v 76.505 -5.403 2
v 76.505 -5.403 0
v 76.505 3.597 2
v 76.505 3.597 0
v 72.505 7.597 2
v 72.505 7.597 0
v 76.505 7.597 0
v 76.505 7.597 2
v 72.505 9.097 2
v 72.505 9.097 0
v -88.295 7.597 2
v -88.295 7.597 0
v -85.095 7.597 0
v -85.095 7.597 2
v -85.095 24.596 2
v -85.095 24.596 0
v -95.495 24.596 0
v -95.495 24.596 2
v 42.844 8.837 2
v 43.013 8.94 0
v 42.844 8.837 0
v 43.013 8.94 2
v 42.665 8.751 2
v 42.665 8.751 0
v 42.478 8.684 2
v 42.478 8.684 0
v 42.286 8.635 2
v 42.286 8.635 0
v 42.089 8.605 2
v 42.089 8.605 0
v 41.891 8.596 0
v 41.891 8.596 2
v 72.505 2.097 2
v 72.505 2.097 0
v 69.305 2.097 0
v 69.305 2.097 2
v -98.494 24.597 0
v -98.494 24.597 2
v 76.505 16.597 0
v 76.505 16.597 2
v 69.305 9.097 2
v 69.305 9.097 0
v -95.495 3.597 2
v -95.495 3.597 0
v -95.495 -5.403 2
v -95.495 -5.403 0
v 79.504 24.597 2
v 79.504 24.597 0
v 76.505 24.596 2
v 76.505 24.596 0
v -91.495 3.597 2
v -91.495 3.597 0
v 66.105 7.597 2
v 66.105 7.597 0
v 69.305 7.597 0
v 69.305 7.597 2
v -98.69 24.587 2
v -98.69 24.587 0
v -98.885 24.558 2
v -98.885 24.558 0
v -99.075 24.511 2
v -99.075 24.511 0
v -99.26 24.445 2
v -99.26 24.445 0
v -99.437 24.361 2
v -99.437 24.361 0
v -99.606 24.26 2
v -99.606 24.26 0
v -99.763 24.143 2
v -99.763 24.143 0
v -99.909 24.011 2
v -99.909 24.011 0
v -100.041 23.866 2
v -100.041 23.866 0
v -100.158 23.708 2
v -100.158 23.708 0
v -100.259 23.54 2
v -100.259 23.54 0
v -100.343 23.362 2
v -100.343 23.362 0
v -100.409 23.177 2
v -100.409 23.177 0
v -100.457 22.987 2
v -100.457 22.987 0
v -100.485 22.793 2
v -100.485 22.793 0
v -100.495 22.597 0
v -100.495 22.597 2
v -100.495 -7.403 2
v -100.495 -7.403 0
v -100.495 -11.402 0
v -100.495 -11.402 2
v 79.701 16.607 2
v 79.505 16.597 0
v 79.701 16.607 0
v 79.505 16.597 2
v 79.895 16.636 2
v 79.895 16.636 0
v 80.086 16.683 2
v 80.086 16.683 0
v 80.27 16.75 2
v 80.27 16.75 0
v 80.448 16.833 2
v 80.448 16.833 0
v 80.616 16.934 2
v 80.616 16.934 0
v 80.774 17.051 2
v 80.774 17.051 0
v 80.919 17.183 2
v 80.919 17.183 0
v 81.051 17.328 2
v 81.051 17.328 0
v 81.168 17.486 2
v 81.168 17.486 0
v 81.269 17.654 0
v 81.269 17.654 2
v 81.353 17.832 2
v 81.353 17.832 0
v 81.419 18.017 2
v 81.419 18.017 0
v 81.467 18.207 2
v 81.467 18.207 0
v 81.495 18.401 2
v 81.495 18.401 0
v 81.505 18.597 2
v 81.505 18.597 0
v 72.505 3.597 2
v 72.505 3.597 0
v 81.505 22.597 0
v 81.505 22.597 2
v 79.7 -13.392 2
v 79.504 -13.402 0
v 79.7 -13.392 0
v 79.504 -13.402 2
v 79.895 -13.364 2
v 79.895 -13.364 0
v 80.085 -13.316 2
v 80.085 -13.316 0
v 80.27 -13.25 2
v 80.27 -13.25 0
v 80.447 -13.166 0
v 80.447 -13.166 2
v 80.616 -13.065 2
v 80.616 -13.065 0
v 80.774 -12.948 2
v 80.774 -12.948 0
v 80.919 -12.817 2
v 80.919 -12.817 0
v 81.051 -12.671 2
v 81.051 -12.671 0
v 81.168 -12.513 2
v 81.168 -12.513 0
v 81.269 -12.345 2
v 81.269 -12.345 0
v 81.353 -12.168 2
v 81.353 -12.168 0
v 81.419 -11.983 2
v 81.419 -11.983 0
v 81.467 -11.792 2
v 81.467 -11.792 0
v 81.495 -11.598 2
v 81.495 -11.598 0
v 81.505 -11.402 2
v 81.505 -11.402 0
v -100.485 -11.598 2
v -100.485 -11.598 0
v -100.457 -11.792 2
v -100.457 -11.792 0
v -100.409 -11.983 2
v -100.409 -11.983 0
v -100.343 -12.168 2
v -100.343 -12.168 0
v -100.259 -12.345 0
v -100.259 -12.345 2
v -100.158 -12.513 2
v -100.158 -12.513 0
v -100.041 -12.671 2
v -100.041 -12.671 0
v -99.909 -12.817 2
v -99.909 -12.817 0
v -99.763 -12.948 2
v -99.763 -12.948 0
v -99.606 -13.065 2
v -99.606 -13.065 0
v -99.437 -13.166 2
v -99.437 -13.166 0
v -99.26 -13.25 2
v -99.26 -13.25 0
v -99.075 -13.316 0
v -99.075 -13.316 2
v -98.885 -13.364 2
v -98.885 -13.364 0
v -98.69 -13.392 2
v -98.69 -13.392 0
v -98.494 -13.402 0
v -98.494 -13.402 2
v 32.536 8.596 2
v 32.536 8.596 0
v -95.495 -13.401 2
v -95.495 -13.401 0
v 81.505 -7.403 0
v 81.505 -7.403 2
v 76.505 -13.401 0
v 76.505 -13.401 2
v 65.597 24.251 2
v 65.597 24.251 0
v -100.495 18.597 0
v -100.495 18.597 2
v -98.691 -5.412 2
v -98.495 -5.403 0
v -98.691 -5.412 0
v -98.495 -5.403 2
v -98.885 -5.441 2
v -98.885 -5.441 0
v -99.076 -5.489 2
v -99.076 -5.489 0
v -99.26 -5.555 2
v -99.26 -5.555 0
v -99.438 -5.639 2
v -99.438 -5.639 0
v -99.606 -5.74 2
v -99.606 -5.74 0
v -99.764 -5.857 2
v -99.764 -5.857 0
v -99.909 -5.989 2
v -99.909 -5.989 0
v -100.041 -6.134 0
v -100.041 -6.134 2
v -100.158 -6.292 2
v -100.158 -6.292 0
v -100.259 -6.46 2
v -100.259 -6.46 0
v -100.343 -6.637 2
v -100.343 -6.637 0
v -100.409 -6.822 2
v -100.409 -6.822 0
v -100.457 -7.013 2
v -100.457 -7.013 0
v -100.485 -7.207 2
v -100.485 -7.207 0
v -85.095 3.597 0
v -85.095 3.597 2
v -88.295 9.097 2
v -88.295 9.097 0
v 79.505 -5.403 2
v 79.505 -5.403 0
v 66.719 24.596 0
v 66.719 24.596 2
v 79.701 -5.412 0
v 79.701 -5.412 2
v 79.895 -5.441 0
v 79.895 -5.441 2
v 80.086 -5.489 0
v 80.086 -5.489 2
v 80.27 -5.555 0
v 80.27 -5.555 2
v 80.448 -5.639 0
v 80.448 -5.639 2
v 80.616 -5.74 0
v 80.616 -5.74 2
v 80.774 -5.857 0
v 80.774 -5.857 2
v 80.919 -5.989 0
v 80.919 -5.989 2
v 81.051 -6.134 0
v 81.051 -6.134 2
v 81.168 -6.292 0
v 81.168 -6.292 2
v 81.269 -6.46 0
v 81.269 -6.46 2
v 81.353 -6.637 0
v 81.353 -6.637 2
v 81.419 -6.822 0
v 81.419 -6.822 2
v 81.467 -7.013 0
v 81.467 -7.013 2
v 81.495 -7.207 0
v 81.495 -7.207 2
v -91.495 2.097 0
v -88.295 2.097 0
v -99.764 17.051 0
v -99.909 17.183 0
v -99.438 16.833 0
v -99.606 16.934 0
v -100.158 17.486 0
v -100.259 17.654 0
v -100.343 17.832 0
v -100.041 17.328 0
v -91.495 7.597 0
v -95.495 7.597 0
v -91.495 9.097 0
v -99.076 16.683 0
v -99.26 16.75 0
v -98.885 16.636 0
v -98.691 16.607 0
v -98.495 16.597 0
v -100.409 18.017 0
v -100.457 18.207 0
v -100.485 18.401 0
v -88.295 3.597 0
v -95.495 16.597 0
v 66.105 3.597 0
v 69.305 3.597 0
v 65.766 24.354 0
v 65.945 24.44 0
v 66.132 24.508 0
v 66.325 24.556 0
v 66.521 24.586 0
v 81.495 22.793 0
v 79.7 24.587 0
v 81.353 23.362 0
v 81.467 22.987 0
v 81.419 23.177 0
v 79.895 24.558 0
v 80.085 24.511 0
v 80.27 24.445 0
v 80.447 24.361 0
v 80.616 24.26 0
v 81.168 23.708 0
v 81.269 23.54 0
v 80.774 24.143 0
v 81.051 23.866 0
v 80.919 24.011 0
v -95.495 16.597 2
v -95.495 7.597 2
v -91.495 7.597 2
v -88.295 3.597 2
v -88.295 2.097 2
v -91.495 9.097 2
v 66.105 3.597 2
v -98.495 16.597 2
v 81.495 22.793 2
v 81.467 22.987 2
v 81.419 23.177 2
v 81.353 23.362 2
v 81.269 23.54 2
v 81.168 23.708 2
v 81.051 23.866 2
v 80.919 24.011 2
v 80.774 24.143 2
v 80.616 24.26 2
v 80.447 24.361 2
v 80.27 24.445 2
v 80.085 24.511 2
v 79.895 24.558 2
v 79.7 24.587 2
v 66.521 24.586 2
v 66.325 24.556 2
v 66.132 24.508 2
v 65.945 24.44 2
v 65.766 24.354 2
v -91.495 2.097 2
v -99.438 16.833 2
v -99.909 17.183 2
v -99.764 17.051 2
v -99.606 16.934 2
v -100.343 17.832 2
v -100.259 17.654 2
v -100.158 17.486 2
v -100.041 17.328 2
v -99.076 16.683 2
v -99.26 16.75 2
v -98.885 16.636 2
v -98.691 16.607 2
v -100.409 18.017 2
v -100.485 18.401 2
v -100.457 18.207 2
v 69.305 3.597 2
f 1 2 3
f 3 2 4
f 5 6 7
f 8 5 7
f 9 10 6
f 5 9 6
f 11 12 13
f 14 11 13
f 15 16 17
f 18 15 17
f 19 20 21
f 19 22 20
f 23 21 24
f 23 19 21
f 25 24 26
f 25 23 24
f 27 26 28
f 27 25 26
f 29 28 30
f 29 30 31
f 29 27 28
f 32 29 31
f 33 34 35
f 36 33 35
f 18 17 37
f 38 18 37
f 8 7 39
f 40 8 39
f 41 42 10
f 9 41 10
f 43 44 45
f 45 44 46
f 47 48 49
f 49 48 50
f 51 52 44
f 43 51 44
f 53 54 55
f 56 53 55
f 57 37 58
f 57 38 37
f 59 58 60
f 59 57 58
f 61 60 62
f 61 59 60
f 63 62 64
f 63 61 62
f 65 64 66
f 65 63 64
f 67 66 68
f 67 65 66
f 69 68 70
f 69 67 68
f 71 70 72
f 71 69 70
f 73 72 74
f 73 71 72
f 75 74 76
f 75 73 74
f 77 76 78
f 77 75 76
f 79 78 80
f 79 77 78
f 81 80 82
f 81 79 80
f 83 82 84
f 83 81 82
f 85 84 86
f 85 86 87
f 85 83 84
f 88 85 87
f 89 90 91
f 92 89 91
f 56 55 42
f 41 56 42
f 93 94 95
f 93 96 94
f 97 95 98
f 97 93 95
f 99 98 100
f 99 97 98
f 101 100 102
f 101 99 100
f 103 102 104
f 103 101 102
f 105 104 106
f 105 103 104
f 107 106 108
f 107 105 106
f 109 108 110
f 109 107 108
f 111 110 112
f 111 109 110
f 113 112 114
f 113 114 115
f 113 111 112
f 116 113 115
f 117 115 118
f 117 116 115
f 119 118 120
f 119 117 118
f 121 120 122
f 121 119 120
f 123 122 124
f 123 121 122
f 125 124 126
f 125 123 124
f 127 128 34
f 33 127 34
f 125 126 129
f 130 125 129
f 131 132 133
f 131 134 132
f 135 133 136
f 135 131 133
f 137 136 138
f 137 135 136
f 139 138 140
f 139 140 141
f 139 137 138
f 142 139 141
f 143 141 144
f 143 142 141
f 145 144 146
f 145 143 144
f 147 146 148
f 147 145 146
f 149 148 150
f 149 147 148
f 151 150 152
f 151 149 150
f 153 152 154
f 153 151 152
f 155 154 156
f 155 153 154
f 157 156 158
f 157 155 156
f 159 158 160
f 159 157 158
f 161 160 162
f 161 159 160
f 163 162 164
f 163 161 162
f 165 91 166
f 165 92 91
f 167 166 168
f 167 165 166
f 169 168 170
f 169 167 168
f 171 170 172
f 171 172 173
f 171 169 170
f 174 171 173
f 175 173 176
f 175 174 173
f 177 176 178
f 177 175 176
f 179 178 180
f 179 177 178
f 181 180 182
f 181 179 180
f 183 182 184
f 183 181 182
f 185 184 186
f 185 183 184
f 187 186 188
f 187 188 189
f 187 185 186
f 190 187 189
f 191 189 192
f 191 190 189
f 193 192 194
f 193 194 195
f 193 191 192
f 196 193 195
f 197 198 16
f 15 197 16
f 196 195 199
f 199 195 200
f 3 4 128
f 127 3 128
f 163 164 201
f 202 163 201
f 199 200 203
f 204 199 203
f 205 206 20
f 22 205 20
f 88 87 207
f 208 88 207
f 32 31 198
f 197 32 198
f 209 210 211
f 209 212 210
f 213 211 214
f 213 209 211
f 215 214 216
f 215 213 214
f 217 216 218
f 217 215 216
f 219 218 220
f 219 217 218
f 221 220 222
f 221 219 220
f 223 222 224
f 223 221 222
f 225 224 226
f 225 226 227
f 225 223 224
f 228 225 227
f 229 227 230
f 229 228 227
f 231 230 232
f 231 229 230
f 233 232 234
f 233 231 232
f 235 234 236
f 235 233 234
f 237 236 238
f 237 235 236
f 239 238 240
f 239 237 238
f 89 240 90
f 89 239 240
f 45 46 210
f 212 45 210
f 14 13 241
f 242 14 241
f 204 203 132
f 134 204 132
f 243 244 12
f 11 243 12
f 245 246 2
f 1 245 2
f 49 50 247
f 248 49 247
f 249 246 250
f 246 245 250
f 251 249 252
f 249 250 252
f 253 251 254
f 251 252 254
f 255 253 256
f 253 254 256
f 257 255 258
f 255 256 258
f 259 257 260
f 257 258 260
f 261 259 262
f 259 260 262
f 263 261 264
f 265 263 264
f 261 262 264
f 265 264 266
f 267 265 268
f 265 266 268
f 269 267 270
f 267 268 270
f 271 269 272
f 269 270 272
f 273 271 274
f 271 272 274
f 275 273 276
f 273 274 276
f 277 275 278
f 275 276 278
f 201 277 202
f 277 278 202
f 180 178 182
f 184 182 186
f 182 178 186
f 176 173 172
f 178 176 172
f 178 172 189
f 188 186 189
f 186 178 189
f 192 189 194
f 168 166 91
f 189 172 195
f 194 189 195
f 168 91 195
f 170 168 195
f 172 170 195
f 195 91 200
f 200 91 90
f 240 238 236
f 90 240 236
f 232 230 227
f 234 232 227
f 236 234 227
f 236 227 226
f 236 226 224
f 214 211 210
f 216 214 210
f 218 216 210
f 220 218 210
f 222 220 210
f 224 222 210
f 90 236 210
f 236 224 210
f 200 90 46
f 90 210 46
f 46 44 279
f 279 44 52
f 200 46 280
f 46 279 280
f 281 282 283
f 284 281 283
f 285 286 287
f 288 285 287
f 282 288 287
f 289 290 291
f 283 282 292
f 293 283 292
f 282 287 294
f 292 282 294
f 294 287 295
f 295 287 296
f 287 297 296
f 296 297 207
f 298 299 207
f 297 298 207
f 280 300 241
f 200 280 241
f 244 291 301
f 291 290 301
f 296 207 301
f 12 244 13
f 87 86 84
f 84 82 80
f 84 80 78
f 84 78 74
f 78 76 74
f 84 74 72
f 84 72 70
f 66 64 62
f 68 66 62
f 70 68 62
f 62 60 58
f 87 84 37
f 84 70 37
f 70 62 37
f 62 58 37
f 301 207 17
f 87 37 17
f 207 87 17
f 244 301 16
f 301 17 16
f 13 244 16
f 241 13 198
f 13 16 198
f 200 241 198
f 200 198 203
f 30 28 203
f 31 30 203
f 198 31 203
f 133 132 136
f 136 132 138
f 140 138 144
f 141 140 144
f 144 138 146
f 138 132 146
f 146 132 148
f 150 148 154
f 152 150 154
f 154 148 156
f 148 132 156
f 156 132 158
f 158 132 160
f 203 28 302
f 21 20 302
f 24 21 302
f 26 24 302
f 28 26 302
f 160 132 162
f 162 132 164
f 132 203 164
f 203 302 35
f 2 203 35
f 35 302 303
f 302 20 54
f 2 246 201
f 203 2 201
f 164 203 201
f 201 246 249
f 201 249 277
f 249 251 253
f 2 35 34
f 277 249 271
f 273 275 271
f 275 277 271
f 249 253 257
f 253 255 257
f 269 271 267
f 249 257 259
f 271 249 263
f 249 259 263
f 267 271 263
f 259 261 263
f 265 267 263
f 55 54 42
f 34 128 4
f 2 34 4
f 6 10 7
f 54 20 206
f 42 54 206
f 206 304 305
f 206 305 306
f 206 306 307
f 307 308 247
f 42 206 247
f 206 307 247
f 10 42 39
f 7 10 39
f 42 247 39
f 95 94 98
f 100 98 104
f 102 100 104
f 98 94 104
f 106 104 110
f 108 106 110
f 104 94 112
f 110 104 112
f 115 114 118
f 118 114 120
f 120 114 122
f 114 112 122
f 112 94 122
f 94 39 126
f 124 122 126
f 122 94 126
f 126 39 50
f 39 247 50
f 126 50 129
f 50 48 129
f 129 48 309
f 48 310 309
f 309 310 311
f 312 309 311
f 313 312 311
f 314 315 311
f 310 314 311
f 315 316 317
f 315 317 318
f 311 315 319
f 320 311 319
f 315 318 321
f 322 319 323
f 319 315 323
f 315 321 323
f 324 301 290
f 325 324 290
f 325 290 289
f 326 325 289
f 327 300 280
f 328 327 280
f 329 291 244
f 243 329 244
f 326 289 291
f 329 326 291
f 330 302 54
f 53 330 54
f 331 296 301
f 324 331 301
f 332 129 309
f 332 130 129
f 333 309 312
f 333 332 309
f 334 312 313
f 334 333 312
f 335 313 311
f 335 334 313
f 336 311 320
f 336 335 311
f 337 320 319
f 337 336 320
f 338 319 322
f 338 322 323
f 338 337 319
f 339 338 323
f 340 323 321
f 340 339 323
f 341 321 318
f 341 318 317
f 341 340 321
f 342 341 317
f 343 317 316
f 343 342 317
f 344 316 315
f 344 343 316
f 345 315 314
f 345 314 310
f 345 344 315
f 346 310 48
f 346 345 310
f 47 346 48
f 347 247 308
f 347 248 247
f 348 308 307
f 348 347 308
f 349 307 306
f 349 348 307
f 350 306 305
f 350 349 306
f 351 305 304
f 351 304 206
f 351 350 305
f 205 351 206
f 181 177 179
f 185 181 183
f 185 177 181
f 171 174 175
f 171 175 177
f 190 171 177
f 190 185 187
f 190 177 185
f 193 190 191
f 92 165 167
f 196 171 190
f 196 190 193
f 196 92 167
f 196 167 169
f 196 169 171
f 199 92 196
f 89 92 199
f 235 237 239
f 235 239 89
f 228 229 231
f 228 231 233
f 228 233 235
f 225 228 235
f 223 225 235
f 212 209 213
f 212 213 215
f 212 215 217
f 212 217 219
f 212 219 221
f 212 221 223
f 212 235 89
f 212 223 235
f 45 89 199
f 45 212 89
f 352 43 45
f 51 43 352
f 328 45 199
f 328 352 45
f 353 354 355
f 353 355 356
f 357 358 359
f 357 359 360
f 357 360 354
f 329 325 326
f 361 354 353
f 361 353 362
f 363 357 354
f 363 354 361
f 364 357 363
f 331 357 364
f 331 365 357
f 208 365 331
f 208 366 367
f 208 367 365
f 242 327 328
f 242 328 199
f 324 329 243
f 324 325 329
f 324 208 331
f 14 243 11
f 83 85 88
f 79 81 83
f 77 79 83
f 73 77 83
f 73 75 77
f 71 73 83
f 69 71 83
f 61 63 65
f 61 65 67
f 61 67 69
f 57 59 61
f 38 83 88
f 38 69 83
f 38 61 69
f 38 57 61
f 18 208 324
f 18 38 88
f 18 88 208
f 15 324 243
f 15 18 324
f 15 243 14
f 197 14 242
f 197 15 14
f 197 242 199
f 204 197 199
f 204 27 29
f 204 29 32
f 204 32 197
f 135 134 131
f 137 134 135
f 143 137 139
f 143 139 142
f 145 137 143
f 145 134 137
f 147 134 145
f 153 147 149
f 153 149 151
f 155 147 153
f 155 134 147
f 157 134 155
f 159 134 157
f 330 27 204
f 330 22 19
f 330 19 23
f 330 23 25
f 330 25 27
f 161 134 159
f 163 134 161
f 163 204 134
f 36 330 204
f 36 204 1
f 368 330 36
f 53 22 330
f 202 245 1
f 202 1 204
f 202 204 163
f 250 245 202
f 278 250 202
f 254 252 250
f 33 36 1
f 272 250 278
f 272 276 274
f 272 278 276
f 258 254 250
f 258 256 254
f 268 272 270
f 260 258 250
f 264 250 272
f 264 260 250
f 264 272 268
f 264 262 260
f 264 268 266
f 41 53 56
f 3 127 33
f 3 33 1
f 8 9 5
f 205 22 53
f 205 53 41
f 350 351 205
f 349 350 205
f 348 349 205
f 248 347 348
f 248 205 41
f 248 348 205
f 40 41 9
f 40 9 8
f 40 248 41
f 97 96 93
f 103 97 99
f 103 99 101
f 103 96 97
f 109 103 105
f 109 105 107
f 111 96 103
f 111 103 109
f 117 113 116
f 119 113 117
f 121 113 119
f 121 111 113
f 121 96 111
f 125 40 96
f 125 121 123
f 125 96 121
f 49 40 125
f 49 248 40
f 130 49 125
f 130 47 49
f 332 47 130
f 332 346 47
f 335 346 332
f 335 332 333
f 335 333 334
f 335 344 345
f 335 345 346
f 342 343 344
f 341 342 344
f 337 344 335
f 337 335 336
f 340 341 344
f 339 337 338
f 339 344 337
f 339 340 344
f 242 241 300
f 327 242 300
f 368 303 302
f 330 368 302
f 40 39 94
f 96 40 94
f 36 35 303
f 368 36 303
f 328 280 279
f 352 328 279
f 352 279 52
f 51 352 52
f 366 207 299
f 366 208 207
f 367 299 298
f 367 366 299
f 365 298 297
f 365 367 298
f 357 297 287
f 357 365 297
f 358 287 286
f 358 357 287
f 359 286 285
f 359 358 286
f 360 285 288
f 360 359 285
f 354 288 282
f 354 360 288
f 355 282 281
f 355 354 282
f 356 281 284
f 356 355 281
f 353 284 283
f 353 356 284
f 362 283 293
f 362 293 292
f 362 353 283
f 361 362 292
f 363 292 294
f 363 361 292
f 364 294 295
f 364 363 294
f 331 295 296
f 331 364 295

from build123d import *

# Parameters (mm, degrees)
EXTRUDE_1_DEPTH = 2
FILLET_1_R      = 2


with BuildPart() as part:
    # 草图1 → 凸台-拉伸1 (new body)
    with BuildSketch(Plane.XY):
        Polygon((81.505044408, -5.402721296), (76.505044408, -5.402721296), (76.505044408, 3.597278862), (72.505044408, 3.597278862), (72.505044408, 2.097278862), (69.305044408, 2.097278862), (69.305044408, 3.597278862), (66.105044408, 3.597278862), (66.105044408, 7.597278862), (69.305044408, 7.597278862), (69.305044408, 9.097278862), (72.505044408, 9.097278862), (72.505044408, 7.597278862), (76.505044408, 7.597278862), (76.505044408, 16.59727902), (81.505044408, 16.59727902), (81.505044408, 24.59727902), (76.505044688, 24.595607728), (66.105044408, 24.595607728), (42.505044408, 8.595607728), (32.535817857, 8.595607728), (-85.094955033, 24.595607728), (-95.494955312, 24.595607728), (-100.494955033, 24.59727902), (-100.494955033, 16.59727902), (-95.494955033, 16.59727902), (-95.494955033, 7.597278862), (-91.494955033, 7.597278862), (-91.494955033, 9.097278862), (-88.294955033, 9.097278862), (-88.294955033, 7.597278862), (-85.094955033, 7.597278862), (-85.094955033, 3.597278862), (-88.294955033, 3.597278862), (-88.294955033, 2.097278862), (-91.494955033, 2.097278862), (-91.494955033, 3.597278862), (-95.494955033, 3.597278862), (-95.494955033, -5.402721296), (-100.494955033, -5.402721296), (-100.494955033, -13.402721296), (-95.494955312, -13.401050004), (76.505044688, -13.401050004), (81.505044408, -13.402721296), align=None)
    extrude(amount=EXTRUDE_1_DEPTH)

    # 圆角1
    fillet_1_edges = [part.edges().sort_by_distance(p)[0] for p in [
        (42.505044408, 8.595607728, 1),
        (66.105044408, 24.595607728, 1),
        (81.505044408, 24.59727902, 1),
        (81.505044408, 16.59727902, 1),
        (81.505044408, -5.402721296, 1),
        (81.505044408, -13.402721296, 1),
        (-100.494955033, -13.402721296, 1),
        (-100.494955033, -5.402721296, 1),
        (-100.494955033, 16.59727902, 1),
        (-100.494955033, 24.59727902, 1),
    ]]
    fillet(fillet_1_edges, radius=FILLET_1_R)


solid = part.part
